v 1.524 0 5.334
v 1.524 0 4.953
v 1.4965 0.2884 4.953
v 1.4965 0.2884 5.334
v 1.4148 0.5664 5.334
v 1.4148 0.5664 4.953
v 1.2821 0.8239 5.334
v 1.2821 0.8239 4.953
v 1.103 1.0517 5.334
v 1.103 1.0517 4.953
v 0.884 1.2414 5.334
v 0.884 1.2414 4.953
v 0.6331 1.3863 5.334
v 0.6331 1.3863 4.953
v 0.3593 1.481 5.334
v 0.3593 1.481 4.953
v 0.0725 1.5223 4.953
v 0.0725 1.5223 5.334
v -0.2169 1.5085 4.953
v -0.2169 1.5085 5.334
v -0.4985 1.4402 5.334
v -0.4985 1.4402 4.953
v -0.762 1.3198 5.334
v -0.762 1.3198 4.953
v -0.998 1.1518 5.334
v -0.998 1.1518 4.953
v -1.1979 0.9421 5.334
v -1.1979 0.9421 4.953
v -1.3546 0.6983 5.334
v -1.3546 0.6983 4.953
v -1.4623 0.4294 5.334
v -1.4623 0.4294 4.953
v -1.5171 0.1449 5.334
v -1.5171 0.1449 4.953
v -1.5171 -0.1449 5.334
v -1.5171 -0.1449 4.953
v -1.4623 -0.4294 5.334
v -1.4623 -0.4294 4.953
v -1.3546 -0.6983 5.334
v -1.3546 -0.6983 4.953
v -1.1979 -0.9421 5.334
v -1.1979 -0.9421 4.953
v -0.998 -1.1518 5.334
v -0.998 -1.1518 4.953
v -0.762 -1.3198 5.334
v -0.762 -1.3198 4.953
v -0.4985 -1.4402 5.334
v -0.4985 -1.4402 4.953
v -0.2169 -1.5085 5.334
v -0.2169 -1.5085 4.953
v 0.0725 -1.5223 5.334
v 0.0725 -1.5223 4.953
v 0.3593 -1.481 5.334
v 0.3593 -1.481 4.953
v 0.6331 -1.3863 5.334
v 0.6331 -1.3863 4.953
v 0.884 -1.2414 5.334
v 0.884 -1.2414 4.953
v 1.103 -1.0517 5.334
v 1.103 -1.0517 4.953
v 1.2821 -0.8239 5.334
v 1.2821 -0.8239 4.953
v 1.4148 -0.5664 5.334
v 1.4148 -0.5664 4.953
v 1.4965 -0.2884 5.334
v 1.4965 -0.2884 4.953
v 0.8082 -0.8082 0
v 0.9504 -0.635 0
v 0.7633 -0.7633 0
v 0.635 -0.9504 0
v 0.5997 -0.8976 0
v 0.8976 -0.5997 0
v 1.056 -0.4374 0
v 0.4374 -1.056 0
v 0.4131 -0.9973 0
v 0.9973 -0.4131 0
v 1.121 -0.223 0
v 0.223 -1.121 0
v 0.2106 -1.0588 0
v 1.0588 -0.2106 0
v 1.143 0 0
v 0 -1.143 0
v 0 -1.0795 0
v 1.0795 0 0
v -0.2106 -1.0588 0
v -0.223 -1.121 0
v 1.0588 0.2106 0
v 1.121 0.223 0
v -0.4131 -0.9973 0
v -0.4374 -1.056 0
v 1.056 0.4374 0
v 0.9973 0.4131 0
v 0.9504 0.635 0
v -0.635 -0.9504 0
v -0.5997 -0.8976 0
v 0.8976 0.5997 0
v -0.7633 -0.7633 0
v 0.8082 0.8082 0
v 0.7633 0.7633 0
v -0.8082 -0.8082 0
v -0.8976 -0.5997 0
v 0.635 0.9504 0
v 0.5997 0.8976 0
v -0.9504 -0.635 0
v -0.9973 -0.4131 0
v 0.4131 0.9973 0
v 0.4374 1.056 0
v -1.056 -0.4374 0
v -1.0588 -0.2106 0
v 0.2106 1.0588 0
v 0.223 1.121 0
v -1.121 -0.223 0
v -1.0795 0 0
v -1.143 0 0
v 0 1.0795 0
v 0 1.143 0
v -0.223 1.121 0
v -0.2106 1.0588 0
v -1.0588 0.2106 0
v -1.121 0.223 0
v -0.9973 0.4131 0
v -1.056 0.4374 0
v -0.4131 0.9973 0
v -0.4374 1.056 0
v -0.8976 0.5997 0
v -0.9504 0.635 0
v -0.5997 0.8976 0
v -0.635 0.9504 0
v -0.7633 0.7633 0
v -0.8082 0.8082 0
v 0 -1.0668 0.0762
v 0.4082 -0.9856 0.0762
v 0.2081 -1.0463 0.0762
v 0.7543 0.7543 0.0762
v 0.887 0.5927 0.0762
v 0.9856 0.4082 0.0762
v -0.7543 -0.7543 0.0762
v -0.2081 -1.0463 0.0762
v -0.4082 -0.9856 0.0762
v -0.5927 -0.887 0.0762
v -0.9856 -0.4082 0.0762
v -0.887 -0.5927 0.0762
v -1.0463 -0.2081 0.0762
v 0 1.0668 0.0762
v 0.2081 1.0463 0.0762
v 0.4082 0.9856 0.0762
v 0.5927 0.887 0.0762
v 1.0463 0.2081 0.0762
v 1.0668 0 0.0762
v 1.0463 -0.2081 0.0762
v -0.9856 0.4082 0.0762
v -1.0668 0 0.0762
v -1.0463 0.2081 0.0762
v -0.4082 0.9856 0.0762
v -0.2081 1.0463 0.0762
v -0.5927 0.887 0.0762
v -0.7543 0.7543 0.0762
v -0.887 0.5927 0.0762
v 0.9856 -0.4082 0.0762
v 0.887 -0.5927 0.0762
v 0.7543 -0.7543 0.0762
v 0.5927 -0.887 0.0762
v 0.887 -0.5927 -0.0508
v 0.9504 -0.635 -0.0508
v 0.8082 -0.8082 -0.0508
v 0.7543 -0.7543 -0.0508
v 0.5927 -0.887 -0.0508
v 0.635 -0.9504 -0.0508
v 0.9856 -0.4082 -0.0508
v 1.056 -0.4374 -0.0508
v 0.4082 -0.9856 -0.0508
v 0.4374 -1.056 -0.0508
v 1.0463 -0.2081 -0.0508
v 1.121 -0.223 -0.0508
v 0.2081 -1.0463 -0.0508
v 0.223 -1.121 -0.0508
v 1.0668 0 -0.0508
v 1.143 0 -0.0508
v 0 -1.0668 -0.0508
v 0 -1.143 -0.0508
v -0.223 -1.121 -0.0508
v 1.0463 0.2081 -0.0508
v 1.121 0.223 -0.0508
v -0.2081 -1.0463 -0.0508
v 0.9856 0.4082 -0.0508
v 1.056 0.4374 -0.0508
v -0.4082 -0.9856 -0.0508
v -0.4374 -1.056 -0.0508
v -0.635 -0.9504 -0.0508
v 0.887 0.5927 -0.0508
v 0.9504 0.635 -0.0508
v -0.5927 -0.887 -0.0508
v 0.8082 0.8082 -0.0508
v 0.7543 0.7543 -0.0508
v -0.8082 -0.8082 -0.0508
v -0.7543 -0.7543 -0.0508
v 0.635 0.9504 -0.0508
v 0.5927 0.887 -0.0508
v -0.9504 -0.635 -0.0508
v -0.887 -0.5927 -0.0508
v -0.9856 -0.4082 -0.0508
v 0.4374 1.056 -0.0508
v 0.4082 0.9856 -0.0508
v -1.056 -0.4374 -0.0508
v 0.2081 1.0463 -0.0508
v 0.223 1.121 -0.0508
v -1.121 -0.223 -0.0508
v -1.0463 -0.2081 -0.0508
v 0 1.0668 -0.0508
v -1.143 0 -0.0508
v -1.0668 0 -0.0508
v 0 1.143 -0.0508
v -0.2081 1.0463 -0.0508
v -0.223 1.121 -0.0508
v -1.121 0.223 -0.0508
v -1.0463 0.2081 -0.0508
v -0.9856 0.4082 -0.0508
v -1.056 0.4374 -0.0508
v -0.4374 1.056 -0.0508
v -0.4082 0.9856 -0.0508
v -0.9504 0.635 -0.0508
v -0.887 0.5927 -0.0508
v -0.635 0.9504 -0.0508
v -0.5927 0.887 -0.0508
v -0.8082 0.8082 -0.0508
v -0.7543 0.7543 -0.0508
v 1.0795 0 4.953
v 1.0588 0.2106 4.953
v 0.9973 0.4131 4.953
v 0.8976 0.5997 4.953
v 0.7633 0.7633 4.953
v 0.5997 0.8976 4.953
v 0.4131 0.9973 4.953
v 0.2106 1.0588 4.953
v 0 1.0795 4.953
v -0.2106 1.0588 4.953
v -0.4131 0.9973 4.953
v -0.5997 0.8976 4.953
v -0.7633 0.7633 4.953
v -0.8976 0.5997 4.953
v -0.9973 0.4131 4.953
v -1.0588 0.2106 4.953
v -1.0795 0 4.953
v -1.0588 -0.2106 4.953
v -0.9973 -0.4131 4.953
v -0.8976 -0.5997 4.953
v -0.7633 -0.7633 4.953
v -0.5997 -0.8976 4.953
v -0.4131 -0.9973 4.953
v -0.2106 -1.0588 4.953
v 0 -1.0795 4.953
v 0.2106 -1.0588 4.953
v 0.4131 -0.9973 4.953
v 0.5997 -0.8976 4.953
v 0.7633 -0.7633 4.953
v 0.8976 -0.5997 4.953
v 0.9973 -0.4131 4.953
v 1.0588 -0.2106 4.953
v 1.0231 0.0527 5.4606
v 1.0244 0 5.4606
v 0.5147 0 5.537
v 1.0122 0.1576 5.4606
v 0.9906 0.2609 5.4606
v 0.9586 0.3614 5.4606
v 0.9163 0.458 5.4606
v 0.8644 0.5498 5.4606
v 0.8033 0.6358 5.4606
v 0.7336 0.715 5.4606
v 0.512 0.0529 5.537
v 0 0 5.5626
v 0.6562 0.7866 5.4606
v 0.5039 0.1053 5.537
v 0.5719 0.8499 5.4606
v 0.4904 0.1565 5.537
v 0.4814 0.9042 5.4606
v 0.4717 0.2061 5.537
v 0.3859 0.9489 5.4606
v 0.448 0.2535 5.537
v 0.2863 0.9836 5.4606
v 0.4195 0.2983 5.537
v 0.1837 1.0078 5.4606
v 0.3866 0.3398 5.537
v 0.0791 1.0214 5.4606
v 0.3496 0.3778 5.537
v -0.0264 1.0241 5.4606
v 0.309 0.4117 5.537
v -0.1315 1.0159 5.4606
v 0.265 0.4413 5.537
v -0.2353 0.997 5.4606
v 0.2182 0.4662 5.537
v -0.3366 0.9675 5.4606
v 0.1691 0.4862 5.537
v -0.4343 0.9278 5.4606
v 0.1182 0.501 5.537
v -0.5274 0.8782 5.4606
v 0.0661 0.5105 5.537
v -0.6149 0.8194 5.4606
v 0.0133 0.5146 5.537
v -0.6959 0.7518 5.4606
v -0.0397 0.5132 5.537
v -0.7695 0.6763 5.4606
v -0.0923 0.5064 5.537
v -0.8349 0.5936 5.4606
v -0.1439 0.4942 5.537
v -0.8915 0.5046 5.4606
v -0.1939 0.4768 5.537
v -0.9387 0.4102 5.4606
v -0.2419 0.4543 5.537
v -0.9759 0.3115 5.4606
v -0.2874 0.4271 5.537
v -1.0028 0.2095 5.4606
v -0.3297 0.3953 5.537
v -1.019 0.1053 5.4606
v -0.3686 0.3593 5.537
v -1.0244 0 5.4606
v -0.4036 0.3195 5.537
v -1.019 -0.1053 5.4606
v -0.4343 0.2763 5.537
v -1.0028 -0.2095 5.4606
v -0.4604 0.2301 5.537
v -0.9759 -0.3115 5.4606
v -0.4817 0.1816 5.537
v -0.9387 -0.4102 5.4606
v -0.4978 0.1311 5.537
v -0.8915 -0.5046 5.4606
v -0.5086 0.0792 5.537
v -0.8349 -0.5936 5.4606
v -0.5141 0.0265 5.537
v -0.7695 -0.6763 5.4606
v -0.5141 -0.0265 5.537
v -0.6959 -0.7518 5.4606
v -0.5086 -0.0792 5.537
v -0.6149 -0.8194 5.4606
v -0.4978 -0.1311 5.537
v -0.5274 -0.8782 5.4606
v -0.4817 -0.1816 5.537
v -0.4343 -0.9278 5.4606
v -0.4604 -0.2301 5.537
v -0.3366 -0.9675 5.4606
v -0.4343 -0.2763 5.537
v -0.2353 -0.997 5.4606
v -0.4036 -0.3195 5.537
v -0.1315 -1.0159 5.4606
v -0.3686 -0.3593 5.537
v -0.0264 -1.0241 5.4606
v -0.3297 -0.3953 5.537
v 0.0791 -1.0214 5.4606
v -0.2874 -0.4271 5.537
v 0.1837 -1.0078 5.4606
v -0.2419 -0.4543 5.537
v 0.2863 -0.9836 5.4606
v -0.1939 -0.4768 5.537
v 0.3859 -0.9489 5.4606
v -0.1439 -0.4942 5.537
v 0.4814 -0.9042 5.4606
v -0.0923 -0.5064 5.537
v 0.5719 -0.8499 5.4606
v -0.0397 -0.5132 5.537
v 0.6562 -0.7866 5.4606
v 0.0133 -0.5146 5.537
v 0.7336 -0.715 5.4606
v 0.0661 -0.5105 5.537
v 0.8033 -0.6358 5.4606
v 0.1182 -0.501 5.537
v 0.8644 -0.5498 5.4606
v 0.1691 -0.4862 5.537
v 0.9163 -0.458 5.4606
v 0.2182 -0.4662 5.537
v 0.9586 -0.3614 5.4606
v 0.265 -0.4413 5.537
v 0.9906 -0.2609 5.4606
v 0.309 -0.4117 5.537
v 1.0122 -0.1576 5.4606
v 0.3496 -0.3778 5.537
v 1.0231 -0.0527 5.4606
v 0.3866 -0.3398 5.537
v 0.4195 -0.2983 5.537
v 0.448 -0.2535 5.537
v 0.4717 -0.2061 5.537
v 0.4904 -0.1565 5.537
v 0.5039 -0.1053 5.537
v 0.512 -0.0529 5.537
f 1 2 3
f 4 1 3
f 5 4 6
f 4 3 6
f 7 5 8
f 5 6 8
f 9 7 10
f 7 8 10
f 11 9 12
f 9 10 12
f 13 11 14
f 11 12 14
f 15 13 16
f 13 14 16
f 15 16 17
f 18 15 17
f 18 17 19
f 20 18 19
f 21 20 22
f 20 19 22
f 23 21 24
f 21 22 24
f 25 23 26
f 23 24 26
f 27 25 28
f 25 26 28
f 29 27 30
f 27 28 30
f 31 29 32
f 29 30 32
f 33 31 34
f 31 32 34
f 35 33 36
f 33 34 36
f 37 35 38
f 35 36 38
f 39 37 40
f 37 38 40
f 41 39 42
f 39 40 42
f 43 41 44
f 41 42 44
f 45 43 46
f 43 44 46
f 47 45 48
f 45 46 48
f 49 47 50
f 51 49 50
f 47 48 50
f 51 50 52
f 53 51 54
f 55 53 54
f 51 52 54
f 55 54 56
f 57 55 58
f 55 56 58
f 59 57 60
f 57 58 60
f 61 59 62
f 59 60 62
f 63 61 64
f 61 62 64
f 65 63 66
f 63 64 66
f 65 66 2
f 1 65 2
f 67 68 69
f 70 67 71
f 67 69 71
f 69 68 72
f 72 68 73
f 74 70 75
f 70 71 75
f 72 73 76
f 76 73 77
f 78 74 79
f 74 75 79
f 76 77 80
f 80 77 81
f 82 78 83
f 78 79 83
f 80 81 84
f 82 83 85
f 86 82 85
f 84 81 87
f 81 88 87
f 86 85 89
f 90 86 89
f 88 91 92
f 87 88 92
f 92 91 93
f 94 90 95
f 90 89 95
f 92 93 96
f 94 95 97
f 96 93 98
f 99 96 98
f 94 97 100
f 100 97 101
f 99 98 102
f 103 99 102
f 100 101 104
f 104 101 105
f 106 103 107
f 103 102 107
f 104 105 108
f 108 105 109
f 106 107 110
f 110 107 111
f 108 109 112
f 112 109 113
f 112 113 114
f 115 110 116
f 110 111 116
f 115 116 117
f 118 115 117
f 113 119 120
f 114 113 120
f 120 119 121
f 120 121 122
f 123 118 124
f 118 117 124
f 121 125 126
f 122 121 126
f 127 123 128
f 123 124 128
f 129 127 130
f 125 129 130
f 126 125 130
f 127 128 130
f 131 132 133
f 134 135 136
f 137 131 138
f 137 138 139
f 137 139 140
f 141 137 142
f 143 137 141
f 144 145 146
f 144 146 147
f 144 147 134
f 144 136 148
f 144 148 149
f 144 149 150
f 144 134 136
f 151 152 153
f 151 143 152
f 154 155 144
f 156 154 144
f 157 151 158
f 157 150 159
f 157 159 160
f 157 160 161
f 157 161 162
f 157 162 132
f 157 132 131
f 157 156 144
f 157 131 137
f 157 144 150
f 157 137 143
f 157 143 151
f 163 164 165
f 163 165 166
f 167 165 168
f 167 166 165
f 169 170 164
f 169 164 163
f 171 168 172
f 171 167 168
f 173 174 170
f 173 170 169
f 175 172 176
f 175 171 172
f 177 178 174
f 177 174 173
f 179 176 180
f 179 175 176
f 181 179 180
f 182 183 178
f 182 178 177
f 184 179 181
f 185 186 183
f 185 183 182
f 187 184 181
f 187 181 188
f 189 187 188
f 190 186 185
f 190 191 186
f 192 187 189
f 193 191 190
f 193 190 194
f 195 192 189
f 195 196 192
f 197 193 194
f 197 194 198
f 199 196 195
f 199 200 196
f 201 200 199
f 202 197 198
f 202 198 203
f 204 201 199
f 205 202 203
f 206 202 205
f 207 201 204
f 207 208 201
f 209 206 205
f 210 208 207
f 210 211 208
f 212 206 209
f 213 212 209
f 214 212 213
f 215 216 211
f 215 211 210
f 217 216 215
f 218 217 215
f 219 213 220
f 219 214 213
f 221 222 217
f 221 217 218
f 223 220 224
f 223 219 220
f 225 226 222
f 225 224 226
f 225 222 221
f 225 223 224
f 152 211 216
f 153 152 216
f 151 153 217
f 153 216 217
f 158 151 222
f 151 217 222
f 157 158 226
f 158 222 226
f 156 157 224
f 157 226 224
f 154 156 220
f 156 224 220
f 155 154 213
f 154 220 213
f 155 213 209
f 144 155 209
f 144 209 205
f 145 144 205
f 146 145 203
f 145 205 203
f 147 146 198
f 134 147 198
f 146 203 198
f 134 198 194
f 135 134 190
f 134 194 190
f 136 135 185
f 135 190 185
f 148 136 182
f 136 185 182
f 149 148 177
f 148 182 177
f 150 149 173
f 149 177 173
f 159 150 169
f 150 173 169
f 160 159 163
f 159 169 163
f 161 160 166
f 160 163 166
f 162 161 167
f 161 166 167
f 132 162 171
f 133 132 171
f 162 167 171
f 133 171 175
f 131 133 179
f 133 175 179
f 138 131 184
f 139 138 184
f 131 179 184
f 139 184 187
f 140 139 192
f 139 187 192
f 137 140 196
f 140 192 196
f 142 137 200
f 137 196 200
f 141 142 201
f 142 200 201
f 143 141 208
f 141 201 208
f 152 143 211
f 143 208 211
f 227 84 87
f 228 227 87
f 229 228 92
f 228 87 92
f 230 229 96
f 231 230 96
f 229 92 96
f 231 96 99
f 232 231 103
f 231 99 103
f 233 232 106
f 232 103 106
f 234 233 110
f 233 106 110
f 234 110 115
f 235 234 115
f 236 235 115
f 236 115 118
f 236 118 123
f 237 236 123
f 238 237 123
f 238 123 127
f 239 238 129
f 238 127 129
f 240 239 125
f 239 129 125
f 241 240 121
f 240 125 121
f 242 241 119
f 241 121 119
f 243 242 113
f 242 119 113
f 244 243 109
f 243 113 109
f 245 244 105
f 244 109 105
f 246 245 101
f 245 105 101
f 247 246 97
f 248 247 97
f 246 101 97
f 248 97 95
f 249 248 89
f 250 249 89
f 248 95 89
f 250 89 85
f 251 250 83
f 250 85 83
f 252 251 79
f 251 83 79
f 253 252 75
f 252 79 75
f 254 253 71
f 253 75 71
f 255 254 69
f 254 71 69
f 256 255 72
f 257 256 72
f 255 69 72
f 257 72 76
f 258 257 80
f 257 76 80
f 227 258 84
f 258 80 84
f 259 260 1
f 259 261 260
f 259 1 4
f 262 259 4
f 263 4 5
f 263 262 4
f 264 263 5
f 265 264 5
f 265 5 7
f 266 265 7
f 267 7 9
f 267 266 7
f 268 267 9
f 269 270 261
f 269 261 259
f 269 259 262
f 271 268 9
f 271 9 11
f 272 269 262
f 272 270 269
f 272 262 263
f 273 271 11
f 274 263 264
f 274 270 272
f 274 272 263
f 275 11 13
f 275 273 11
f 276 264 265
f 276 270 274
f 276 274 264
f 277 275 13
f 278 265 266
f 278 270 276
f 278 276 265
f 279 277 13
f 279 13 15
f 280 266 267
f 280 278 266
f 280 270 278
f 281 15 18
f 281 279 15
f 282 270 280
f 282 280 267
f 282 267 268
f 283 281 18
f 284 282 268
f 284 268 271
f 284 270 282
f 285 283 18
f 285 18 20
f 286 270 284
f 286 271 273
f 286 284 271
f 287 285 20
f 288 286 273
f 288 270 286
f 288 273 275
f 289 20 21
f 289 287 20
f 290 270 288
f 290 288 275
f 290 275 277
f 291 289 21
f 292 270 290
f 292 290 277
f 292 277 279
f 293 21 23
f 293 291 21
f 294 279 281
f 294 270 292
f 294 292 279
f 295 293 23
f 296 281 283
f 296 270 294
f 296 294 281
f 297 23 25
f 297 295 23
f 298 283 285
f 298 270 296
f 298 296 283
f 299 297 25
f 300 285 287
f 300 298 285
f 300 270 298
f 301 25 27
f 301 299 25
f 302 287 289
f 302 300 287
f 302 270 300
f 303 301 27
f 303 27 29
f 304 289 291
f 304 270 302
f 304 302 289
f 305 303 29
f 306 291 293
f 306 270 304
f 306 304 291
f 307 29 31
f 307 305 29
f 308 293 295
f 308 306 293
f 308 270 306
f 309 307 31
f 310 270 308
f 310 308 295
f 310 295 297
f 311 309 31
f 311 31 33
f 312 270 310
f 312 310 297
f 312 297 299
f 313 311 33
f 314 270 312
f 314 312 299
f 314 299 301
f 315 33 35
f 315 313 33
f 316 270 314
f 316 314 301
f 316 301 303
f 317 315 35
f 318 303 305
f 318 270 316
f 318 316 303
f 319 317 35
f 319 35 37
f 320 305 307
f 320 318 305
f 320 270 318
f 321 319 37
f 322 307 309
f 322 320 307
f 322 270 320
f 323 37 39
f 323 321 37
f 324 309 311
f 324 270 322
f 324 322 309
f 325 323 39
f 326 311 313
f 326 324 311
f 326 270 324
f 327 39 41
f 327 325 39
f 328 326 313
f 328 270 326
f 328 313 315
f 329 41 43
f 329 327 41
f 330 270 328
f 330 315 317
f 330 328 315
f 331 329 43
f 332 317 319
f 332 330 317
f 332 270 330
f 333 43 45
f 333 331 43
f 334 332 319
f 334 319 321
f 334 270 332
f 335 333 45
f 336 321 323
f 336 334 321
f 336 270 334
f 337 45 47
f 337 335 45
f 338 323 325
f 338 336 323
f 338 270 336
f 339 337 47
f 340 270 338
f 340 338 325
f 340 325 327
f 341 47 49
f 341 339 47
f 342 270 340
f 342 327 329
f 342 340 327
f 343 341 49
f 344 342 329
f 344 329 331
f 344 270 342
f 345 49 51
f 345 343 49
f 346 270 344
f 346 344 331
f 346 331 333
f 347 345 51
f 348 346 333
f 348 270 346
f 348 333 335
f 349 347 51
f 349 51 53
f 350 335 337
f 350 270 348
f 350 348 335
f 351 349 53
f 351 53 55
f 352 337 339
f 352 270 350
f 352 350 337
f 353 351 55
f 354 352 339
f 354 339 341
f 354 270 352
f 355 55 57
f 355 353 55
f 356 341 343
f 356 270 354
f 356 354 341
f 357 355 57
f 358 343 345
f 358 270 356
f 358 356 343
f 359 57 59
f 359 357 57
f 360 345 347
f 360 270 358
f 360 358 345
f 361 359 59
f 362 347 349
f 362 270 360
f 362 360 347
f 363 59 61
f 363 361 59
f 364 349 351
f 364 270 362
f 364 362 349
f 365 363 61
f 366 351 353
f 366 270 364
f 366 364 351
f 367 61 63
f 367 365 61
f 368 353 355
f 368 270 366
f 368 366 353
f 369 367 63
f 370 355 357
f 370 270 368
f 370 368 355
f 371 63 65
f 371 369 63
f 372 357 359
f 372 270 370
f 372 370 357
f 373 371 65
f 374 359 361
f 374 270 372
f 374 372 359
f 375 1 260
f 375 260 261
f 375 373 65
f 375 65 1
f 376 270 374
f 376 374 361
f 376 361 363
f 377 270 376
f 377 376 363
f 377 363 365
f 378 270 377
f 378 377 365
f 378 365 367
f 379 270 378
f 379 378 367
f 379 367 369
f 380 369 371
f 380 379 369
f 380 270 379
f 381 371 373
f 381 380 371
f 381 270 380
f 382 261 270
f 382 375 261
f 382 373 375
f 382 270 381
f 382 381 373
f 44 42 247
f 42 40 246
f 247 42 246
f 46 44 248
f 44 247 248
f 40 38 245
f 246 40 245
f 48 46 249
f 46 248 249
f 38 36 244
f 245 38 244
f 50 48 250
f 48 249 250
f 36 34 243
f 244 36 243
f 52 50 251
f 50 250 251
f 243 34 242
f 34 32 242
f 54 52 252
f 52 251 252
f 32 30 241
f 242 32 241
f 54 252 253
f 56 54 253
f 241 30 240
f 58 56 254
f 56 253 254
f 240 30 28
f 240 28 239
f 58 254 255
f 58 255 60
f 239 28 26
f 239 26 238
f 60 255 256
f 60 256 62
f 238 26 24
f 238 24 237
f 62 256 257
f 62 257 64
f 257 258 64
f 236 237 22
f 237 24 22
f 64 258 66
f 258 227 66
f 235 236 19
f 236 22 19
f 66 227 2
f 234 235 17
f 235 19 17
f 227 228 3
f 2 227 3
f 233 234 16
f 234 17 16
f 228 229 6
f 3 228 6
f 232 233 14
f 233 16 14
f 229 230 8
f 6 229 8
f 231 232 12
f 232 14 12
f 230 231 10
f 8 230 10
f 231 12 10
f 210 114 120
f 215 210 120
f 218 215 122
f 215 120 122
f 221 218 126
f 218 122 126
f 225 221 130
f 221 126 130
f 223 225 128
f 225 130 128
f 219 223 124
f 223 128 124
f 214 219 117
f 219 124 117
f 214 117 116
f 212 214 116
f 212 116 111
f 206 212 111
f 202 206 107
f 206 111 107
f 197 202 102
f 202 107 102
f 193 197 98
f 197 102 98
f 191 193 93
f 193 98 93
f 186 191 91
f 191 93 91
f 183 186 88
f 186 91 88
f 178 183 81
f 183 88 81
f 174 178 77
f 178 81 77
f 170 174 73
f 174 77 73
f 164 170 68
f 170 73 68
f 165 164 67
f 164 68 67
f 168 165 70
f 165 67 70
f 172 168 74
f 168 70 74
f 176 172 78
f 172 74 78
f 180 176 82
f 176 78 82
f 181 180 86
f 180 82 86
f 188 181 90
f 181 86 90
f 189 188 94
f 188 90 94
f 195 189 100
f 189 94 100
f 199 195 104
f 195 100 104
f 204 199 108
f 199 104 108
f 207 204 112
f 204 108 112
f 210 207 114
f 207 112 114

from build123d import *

# Parameters (mm, degrees)
SKETCH1_R           = 1.0795
BOSS_EXTRUDE1_DEPTH = 4.953
SKETCH2_R           = 1.524
BOSS_EXTRUDE2_DEPTH = 0.381
DOME1_FACE_RADIUS   = 1.524
DOME1_HEIGHT        = 0.2286
SKETCH3_R           = 1.143
BOSS_EXTRUDE3_DEPTH = 0.0508
SKETCH4_R           = 1.0668
CUT_EXTRUDE1_DEPTH  = 0.127


with BuildPart() as part:
    # Sketch1 → Boss-Extrude1 (new body)
    with BuildSketch(Plane.XY):
        Circle(SKETCH1_R)
    extrude(amount=BOSS_EXTRUDE1_DEPTH)

    # Sketch2 → Boss-Extrude2 (add)
    with BuildSketch(Plane.XY.offset(4.953)):
        Circle(SKETCH2_R)
    extrude(amount=BOSS_EXTRUDE2_DEPTH)

    # Dome1: a dome of height H over a round flat face of radius A is a cap of a sphere of radius (A * A + H * H) / (2 * H)
    dome1_r = (DOME1_FACE_RADIUS * DOME1_FACE_RADIUS + DOME1_HEIGHT * DOME1_HEIGHT) / (2 * DOME1_HEIGHT)
    dome1_base = Plane((0, 0, 5.334), z_dir=(0, 0, 1))
    with Locations(dome1_base.offset(DOME1_HEIGHT - dome1_r)):
        dome1_ball = Sphere(dome1_r, mode=Mode.PRIVATE)
    add(split(dome1_ball, bisect_by=dome1_base, keep=Keep.TOP, mode=Mode.PRIVATE))

    # Sketch3 → Boss-Extrude3 (add)
    with BuildSketch(Plane(origin=(0, 0, 0), x_dir=(-1, 0, 0), z_dir=(0, 0, -1))):
        Circle(SKETCH3_R)
    extrude(amount=BOSS_EXTRUDE3_DEPTH)

    # Sketch4 → Cut-Extrude1 (cut)
    with BuildSketch(Plane(origin=(0, 0, -0.0508), x_dir=(-1, 0, 0), z_dir=(0, 0, -1))):
        Circle(SKETCH4_R)
    extrude(amount=-CUT_EXTRUDE1_DEPTH, mode=Mode.SUBTRACT)


solid = part.part
